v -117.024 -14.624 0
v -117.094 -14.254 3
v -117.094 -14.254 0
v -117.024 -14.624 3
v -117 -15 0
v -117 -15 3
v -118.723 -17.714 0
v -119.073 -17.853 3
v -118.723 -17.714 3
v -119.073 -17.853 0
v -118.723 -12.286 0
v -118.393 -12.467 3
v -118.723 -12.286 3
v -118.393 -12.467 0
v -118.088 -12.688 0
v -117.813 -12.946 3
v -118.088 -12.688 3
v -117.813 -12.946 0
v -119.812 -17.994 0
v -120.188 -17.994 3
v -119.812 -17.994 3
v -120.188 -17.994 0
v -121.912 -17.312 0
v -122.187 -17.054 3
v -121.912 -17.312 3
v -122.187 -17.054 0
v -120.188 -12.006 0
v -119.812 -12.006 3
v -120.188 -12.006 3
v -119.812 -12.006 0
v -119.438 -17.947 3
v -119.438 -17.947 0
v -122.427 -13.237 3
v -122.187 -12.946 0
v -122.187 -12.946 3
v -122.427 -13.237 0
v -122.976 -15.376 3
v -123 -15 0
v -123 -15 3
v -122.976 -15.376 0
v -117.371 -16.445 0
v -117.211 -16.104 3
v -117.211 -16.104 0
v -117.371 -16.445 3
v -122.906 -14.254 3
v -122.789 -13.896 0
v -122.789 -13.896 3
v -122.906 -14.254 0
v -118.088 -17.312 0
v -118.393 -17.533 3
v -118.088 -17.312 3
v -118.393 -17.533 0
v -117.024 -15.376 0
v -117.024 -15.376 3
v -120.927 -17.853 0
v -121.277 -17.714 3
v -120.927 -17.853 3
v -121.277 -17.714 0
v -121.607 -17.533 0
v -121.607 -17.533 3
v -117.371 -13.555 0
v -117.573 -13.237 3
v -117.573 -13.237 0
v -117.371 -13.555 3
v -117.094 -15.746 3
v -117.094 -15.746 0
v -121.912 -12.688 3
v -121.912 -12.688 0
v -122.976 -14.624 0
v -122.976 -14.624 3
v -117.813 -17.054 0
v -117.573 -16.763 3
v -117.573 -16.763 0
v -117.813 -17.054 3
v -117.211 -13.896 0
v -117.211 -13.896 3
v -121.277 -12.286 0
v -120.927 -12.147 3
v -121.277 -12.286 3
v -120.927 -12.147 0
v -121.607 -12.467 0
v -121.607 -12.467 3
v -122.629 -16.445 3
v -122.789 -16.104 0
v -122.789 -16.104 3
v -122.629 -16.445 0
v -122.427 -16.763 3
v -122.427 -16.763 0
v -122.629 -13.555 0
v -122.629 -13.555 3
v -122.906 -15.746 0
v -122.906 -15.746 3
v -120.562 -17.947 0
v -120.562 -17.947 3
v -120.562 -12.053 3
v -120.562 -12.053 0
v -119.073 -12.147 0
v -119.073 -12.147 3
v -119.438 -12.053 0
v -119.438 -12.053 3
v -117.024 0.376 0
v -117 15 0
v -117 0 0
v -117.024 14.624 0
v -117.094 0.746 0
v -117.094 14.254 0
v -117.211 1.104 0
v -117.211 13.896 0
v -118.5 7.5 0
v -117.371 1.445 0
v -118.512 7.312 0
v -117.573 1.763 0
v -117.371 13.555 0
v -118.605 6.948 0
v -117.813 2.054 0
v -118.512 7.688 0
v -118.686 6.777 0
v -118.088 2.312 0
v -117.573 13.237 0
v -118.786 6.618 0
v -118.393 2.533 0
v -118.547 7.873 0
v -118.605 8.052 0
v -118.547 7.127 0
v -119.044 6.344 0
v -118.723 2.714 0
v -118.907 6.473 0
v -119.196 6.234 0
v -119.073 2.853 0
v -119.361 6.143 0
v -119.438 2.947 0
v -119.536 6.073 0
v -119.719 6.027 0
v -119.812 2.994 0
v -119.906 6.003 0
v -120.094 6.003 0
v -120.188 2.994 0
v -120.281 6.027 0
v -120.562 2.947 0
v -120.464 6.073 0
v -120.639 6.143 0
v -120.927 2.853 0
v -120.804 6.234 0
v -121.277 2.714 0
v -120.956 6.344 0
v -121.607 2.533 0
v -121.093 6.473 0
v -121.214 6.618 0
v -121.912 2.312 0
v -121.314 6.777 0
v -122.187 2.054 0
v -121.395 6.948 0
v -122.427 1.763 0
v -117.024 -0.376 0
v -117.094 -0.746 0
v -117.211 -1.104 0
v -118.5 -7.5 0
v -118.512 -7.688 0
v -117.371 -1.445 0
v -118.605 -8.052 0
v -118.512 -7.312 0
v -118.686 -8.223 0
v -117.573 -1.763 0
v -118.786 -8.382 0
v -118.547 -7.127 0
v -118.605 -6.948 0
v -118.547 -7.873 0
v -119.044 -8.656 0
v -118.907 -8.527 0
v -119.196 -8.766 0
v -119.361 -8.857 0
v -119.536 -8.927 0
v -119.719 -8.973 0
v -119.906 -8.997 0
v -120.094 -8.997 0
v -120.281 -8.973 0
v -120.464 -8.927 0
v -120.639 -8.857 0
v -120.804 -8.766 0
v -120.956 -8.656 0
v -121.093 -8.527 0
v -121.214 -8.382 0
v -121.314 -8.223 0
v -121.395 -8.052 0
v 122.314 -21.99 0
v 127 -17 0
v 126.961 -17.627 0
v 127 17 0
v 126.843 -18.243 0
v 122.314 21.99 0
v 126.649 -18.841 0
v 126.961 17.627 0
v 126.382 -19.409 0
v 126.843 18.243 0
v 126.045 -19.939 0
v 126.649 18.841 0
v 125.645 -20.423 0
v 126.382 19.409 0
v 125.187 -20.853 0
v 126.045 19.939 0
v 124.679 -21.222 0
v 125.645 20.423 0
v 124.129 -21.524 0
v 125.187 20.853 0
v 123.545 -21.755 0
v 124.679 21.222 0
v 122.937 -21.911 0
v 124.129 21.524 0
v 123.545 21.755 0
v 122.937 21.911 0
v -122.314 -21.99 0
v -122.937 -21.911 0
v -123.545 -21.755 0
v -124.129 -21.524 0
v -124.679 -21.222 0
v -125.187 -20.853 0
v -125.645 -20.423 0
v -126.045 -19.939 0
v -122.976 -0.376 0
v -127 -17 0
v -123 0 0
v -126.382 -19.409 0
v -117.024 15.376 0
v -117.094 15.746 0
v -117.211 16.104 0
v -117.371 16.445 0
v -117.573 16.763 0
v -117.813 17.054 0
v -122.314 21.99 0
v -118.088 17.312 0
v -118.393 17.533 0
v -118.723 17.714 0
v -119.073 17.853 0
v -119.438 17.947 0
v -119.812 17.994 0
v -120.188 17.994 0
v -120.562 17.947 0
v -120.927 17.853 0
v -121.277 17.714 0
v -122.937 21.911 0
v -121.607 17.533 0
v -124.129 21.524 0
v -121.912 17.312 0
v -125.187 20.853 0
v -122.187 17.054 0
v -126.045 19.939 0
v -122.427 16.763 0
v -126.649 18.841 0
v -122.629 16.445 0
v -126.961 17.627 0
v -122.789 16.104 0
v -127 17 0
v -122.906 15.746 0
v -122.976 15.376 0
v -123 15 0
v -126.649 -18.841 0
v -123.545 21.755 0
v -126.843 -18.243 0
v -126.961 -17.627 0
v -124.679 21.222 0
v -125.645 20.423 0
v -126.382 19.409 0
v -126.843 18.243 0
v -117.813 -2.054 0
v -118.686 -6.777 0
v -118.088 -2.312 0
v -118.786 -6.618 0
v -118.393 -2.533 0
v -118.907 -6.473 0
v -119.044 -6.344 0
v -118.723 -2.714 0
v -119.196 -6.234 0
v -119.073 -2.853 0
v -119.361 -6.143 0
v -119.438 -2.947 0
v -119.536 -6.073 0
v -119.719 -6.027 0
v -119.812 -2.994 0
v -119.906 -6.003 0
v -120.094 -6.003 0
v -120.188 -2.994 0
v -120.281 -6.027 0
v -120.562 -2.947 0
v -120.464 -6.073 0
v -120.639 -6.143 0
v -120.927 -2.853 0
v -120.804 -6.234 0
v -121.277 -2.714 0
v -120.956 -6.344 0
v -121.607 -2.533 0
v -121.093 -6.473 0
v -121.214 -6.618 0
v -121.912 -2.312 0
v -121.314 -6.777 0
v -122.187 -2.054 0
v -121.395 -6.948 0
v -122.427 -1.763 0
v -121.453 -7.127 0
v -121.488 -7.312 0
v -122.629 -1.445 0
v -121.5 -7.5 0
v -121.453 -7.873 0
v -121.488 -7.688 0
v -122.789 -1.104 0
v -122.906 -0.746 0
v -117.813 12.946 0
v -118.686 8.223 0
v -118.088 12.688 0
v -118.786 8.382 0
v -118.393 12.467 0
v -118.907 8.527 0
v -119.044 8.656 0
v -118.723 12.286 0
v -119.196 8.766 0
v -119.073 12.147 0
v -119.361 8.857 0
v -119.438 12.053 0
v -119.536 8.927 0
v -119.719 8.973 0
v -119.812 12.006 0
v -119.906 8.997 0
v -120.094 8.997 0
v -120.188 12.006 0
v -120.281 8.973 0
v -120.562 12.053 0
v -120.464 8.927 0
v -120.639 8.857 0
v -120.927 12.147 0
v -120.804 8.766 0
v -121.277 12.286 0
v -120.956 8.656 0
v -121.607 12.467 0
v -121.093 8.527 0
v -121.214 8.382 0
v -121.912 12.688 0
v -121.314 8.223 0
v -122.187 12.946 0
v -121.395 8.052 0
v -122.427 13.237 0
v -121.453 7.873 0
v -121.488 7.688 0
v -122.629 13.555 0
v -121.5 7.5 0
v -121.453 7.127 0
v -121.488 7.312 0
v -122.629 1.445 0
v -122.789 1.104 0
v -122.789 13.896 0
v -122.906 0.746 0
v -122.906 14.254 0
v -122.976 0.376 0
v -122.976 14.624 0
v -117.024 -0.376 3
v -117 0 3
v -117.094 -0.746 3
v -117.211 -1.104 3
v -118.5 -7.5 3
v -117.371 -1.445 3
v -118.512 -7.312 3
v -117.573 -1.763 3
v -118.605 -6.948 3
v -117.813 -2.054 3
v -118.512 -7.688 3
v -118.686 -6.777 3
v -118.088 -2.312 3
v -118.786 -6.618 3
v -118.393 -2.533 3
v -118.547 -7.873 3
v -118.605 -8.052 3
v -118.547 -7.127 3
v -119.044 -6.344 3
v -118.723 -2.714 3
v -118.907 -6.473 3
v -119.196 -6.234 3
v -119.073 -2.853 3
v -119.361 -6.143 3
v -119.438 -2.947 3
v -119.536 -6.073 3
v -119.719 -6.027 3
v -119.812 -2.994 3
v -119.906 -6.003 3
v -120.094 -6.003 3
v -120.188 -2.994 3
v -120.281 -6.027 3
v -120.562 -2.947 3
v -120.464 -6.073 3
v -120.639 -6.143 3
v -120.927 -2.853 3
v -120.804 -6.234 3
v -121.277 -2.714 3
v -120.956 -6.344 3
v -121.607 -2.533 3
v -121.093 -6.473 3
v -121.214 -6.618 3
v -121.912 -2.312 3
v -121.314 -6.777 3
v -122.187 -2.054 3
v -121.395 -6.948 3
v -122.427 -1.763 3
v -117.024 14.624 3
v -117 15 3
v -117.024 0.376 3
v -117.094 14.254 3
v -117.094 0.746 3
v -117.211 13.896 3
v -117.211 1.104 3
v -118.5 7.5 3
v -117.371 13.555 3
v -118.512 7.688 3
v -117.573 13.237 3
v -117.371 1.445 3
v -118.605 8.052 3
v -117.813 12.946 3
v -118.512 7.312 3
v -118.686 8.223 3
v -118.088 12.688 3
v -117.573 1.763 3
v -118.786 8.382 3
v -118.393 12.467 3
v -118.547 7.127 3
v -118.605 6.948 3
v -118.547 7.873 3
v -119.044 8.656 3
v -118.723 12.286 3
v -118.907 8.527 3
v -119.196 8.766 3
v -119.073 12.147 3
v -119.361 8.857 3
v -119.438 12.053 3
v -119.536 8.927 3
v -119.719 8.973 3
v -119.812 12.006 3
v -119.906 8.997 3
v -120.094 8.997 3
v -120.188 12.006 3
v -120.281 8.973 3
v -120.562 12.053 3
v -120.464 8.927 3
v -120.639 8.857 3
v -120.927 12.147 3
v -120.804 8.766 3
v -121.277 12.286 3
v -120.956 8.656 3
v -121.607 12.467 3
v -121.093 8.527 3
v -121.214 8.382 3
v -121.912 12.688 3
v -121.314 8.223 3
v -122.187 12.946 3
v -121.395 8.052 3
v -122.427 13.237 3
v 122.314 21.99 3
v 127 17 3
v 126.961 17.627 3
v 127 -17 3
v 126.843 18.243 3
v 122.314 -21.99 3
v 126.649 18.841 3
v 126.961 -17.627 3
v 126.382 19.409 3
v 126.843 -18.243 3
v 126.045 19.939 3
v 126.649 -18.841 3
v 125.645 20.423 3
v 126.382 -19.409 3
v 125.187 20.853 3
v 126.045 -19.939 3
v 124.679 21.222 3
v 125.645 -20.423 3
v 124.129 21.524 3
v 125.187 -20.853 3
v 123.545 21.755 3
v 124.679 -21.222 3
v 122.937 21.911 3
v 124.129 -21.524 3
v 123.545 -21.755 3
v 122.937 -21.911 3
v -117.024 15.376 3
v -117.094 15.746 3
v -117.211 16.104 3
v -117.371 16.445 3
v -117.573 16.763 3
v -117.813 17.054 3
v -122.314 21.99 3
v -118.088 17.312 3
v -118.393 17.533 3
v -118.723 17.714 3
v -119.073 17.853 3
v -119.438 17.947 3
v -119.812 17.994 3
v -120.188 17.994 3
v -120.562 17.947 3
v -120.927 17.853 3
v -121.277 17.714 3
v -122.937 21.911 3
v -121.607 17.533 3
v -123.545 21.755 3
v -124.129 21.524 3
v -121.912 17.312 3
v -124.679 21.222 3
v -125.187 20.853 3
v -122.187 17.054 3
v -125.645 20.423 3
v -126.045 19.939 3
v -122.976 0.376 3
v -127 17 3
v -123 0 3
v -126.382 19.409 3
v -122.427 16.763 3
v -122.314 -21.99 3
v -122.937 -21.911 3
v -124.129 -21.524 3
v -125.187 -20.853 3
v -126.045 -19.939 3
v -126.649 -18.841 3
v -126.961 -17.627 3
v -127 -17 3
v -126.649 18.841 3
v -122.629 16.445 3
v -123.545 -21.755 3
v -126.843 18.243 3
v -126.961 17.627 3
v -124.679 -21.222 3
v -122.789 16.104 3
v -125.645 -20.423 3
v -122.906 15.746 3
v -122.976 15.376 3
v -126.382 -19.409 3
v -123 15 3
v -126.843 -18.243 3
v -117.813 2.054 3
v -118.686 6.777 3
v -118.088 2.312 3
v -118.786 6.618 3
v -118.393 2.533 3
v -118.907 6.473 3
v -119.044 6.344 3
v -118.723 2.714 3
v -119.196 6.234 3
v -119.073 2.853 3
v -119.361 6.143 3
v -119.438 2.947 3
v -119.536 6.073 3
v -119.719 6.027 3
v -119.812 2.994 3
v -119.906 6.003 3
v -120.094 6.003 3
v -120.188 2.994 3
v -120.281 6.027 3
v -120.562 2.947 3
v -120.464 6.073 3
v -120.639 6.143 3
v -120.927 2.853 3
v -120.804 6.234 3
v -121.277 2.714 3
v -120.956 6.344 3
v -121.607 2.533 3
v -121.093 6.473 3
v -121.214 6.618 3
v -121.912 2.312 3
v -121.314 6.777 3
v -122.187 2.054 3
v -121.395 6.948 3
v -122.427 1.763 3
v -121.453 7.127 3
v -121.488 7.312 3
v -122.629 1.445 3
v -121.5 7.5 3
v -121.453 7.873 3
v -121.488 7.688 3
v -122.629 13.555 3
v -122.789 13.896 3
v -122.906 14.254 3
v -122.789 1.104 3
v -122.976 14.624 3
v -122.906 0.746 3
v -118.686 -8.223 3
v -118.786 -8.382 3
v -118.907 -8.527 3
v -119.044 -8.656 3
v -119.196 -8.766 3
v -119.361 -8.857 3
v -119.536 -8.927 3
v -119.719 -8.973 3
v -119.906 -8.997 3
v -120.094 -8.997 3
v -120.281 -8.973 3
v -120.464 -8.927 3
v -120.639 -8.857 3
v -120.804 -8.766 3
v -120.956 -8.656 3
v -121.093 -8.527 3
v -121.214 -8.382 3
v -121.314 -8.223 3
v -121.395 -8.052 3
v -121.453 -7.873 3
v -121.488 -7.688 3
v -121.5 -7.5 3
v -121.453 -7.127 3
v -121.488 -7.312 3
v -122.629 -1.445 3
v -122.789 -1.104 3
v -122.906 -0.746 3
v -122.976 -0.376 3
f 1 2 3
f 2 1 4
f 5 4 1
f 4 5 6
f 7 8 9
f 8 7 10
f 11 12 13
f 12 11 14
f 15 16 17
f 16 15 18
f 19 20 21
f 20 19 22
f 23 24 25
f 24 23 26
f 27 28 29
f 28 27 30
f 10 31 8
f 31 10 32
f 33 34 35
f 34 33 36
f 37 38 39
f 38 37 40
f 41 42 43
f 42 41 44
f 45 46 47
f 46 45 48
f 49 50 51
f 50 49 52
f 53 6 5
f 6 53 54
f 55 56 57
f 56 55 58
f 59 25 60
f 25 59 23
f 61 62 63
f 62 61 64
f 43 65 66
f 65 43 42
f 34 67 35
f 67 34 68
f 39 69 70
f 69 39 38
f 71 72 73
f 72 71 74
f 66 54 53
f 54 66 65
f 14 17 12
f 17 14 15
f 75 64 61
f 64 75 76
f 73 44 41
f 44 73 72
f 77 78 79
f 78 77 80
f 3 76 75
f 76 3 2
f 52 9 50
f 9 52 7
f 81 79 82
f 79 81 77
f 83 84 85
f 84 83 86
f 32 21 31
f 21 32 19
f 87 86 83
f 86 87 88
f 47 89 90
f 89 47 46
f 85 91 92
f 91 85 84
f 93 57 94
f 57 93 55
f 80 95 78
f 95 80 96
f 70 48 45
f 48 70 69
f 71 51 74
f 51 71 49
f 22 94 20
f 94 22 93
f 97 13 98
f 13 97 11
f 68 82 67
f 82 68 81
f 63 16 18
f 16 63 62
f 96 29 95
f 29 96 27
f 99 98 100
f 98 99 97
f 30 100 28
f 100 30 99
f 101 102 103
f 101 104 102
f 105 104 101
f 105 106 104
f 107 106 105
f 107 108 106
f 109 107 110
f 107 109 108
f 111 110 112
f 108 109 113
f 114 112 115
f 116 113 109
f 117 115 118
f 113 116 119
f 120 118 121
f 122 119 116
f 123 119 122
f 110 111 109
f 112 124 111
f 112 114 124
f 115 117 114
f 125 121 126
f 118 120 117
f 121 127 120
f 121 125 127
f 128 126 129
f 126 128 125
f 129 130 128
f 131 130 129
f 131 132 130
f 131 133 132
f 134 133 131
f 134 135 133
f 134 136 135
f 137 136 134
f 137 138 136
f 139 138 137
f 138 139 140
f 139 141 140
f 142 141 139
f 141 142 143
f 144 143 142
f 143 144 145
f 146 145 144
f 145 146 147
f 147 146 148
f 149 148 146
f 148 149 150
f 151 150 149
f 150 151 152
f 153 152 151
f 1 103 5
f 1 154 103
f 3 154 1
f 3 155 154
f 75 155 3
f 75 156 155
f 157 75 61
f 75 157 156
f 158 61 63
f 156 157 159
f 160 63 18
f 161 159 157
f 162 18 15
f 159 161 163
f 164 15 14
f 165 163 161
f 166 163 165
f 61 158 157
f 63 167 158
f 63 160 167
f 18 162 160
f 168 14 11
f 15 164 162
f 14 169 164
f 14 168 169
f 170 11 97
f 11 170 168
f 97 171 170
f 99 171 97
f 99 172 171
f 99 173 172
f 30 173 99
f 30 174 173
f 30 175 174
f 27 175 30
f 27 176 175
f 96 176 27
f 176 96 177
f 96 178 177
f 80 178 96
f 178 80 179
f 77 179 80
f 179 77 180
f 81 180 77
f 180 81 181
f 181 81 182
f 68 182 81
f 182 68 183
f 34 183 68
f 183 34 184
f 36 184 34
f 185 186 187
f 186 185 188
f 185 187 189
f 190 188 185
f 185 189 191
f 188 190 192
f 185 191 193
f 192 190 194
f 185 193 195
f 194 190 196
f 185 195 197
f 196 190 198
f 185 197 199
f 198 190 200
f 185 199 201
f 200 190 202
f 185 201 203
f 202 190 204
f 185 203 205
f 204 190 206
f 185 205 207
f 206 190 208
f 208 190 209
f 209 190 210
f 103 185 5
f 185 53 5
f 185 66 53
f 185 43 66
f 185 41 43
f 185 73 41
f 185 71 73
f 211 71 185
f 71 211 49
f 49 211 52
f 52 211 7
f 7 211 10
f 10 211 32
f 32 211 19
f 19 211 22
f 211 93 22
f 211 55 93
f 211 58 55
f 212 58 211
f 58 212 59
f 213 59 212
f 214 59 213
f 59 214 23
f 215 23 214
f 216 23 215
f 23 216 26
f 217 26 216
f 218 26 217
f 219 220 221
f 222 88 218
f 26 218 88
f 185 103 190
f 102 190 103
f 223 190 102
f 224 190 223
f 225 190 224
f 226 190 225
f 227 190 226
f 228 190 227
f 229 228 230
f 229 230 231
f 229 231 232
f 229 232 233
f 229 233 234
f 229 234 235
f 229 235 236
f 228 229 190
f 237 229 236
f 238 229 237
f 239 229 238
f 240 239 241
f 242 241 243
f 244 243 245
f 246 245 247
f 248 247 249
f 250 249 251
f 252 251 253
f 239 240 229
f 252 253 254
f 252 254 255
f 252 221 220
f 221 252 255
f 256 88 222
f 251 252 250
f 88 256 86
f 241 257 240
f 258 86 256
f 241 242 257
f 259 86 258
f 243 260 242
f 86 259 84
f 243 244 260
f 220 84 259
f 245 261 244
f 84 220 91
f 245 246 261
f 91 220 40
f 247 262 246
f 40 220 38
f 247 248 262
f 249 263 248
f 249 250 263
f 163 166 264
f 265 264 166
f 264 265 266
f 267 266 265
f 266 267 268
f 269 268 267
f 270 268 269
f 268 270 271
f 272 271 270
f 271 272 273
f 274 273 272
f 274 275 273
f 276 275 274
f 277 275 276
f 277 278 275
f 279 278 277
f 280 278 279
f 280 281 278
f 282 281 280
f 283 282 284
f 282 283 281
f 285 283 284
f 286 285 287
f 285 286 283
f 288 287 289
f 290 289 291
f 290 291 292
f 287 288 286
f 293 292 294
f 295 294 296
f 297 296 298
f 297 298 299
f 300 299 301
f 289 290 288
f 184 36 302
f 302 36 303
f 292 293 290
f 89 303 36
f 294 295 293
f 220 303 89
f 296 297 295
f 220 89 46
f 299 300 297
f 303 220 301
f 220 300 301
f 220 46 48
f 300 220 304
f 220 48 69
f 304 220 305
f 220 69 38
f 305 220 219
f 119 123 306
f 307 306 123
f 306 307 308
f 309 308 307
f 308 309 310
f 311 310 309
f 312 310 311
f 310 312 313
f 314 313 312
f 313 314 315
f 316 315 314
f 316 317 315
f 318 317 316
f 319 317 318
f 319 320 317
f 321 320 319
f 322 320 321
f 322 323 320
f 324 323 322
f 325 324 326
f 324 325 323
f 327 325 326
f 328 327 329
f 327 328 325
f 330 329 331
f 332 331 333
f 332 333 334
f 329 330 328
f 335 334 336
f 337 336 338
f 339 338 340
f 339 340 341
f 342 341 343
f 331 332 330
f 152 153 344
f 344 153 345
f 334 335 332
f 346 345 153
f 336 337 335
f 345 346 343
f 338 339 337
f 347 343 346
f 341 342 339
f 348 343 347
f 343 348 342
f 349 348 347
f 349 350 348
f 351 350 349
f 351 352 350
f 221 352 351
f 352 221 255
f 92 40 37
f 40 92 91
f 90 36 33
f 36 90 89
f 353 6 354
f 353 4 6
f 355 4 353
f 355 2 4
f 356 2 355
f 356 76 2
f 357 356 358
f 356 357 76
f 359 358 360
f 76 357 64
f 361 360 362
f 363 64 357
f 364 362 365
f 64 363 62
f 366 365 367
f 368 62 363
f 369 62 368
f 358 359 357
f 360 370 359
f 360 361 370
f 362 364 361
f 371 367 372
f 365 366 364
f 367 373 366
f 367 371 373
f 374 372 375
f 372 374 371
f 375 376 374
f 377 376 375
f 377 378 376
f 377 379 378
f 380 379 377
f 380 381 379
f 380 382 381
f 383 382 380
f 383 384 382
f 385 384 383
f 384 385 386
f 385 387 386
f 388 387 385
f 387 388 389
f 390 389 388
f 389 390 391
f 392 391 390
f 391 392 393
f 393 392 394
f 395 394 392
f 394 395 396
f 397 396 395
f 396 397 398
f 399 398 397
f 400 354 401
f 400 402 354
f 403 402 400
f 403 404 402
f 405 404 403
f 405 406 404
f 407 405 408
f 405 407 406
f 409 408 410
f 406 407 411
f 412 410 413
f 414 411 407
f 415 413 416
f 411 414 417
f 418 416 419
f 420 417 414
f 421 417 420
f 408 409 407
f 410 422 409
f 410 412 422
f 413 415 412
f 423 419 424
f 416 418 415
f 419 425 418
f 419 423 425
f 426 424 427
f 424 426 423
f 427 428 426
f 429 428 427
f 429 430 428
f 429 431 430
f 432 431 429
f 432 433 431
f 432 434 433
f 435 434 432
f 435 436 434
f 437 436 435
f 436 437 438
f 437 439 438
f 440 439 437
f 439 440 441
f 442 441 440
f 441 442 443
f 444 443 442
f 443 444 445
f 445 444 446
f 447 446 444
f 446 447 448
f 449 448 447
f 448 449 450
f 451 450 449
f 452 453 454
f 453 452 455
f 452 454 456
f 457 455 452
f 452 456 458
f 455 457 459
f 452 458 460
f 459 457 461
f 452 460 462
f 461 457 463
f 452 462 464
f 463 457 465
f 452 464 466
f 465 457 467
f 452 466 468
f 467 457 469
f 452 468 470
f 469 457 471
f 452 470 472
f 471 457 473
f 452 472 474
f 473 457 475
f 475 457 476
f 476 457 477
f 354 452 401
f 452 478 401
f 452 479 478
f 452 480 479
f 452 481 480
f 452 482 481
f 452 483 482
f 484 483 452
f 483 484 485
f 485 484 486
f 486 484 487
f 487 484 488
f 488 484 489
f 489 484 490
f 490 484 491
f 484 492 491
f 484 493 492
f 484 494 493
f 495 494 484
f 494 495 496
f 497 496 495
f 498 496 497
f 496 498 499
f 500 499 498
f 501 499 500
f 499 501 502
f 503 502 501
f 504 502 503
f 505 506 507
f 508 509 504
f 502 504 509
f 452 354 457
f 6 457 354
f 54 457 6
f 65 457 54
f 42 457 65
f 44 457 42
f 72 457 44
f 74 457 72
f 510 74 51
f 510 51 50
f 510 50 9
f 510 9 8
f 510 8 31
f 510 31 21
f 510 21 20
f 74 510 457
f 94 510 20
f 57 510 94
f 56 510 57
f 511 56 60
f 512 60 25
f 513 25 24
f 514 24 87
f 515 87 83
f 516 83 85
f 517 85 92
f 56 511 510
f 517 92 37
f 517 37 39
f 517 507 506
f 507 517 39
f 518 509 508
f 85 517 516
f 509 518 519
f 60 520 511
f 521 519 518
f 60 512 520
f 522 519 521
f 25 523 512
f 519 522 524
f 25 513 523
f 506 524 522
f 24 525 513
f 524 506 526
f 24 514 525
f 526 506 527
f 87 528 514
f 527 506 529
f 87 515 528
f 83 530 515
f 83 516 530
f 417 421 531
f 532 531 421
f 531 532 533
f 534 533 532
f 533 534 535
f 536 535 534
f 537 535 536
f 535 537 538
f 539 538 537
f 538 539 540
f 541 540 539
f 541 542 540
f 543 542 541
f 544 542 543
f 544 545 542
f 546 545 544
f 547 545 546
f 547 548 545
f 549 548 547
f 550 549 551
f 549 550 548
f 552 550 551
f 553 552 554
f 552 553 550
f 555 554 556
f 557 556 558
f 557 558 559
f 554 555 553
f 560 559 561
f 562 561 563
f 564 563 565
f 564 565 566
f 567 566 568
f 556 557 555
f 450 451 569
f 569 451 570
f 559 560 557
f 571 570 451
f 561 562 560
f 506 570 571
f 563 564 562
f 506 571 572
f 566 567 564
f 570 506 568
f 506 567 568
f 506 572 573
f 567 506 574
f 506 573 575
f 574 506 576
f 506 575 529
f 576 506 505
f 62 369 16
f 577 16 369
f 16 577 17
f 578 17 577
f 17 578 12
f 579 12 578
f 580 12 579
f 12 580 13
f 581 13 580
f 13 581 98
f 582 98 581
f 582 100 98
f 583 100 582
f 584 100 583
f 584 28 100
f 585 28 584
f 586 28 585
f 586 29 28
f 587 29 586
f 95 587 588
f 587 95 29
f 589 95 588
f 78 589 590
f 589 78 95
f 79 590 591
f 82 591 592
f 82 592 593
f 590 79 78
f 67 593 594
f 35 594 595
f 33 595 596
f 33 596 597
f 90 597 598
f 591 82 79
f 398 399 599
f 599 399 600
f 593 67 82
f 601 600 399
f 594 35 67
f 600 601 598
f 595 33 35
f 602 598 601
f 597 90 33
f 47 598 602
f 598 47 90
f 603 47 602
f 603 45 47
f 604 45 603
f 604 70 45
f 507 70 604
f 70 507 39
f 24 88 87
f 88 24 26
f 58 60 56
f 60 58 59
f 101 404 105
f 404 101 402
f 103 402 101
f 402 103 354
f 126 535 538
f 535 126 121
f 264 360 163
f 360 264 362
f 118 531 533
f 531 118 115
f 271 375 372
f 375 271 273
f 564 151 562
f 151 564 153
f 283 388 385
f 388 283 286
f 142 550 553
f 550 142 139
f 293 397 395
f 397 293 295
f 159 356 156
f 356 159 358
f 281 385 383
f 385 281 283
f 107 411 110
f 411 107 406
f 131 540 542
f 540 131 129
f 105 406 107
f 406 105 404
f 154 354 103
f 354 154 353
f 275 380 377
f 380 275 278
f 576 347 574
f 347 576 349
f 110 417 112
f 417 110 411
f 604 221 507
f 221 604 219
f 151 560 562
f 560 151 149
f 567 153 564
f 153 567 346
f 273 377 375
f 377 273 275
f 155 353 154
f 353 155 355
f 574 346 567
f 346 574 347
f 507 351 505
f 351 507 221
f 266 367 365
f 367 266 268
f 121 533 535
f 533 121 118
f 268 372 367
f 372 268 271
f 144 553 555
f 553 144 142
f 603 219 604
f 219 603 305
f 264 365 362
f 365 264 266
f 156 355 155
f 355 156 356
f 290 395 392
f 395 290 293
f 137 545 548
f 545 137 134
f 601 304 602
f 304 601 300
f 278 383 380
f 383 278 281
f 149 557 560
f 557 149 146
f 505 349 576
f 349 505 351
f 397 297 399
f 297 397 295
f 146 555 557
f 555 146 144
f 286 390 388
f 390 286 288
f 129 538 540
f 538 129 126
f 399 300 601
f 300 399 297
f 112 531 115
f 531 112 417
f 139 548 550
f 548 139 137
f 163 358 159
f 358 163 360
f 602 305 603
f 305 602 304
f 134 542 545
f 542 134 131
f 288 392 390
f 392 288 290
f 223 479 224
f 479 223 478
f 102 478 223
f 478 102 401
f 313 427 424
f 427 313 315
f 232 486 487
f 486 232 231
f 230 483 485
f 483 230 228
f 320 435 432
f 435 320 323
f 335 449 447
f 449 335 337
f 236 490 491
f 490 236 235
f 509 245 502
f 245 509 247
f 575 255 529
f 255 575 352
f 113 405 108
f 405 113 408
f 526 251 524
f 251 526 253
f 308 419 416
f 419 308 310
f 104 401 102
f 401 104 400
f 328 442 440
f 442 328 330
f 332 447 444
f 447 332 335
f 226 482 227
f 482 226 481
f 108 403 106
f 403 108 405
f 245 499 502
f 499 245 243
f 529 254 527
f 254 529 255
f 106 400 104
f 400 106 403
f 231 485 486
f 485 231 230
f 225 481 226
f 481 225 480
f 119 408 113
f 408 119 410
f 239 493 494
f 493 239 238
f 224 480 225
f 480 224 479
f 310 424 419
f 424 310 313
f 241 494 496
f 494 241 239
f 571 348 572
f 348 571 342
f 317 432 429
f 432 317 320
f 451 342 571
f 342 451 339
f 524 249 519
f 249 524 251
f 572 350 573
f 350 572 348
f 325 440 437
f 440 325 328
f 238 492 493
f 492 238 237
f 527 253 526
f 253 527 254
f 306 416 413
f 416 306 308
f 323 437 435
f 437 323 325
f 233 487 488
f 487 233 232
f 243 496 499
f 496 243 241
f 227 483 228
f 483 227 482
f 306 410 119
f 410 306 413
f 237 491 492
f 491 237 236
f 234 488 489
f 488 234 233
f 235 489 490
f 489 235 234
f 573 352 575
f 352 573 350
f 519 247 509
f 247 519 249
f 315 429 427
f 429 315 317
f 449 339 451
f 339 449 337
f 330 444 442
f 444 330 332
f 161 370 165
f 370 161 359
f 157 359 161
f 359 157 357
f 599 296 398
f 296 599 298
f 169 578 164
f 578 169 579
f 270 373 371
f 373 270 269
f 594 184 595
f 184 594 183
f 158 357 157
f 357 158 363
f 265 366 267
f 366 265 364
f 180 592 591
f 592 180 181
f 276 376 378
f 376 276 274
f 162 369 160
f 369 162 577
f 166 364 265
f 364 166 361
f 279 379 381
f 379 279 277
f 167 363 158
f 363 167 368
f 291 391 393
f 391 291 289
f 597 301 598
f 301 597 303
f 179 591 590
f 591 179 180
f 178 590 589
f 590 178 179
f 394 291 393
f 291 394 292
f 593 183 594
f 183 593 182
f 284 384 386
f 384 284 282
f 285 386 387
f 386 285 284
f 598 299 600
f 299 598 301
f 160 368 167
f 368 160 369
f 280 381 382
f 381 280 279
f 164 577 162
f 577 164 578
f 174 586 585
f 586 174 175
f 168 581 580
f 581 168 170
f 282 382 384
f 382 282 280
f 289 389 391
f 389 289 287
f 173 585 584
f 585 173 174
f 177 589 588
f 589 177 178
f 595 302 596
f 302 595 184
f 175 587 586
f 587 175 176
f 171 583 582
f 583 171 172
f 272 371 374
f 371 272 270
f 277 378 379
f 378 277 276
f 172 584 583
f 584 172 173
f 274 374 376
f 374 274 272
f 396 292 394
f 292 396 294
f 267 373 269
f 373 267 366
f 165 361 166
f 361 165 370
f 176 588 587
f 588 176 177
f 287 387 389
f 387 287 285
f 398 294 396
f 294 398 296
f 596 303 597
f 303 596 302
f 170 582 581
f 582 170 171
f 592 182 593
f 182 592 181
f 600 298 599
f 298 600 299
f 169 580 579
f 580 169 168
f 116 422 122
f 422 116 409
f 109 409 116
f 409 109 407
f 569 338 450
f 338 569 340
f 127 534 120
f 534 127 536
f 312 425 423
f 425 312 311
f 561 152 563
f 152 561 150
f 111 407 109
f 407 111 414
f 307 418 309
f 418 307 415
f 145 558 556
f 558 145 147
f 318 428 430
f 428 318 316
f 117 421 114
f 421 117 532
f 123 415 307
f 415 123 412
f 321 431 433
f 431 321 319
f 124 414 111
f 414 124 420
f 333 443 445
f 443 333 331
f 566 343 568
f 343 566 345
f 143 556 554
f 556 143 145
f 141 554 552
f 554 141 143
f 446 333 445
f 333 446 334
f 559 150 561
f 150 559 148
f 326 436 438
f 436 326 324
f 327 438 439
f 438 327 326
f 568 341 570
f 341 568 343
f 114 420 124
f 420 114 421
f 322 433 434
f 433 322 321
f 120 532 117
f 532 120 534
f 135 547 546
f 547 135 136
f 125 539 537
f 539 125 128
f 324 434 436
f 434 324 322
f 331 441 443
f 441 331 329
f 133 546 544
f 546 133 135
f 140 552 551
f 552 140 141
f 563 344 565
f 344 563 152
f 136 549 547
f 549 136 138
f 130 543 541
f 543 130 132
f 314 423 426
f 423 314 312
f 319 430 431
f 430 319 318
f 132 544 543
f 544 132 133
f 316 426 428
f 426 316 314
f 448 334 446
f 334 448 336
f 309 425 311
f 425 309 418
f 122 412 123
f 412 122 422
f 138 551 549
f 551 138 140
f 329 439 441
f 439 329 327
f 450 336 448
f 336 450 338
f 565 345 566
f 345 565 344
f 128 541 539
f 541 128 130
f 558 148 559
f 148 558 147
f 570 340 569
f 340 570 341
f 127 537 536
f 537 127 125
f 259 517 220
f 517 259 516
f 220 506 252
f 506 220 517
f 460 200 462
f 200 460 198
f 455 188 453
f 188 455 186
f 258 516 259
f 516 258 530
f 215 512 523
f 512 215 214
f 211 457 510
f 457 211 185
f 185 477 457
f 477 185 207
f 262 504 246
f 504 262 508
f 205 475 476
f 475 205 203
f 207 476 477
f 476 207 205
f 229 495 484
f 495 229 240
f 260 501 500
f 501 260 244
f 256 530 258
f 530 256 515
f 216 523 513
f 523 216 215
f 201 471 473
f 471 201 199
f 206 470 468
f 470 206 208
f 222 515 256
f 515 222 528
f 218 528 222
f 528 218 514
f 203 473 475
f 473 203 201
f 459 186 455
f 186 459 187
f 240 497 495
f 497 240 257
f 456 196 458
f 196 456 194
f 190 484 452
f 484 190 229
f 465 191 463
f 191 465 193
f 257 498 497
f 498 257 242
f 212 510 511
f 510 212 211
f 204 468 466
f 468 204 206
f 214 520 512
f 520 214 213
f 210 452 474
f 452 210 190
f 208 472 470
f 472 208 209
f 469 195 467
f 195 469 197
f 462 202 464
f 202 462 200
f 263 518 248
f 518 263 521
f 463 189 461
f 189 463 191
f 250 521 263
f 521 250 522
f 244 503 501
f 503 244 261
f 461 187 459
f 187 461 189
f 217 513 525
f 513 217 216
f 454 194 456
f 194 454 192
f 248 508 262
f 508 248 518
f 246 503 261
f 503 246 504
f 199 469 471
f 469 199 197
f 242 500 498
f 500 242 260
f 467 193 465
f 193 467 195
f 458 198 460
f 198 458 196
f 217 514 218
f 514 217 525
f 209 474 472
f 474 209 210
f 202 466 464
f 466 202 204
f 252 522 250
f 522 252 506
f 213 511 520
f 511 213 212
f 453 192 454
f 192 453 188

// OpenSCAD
$fn = 50;


difference() {
	union() {
		hull() {
			translate(v = [-122.0000000000, 17.0000000000, 0]) {
				cylinder(h = 3, r = 5);
			}
			translate(v = [122.0000000000, 17.0000000000, 0]) {
				cylinder(h = 3, r = 5);
			}
			translate(v = [-122.0000000000, -17.0000000000, 0]) {
				cylinder(h = 3, r = 5);
			}
			translate(v = [122.0000000000, -17.0000000000, 0]) {
				cylinder(h = 3, r = 5);
			}
		}
	}
	union() {
		translate(v = [-120.0000000000, -15.0000000000, 0]) {
			cylinder(h = 3, r = 3.0000000000);
		}
		translate(v = [-120.0000000000, 0.0000000000, 0]) {
			cylinder(h = 3, r = 3.0000000000);
		}
		translate(v = [-120.0000000000, 15.0000000000, 0]) {
			cylinder(h = 3, r = 3.0000000000);
		}
		translate(v = [-120.0000000000, -15.0000000000, 0]) {
			cylinder(h = 3, r = 1.5000000000);
		}
		translate(v = [-120.0000000000, -7.5000000000, 0]) {
			cylinder(h = 3, r = 1.5000000000);
		}
		translate(v = [-120.0000000000, 0.0000000000, 0]) {
			cylinder(h = 3, r = 1.5000000000);
		}
		translate(v = [-120.0000000000, 7.5000000000, 0]) {
			cylinder(h = 3, r = 1.5000000000);
		}
		translate(v = [-120.0000000000, 15.0000000000, 0]) {
			cylinder(h = 3, r = 1.5000000000);
		}
		translate(v = [-120.0000000000, -15.0000000000, 0]) {
			cylinder(h = 3, r = 1.5000000000);
		}
		translate(v = [-120.0000000000, -7.5000000000, 0]) {
			cylinder(h = 3, r = 1.5000000000);
		}
		translate(v = [-120.0000000000, 0.0000000000, 0]) {
			cylinder(h = 3, r = 1.5000000000);
		}
		translate(v = [-120.0000000000, 7.5000000000, 0]) {
			cylinder(h = 3, r = 1.5000000000);
		}
		translate(v = [-120.0000000000, 15.0000000000, 0]) {
			cylinder(h = 3, r = 1.5000000000);
		}
		translate(v = [-120.0000000000, -15.0000000000, 0]) {
			cylinder(h = 3, r = 1.5000000000);
		}
		translate(v = [-120.0000000000, -7.5000000000, 0]) {
			cylinder(h = 3, r = 1.5000000000);
		}
		translate(v = [-120.0000000000, 0.0000000000, 0]) {
			cylinder(h = 3, r = 1.5000000000);
		}
		translate(v = [-120.0000000000, 7.5000000000, 0]) {
			cylinder(h = 3, r = 1.5000000000);
		}
		translate(v = [-120.0000000000, 15.0000000000, 0]) {
			cylinder(h = 3, r = 1.5000000000);
		}
	}
}
